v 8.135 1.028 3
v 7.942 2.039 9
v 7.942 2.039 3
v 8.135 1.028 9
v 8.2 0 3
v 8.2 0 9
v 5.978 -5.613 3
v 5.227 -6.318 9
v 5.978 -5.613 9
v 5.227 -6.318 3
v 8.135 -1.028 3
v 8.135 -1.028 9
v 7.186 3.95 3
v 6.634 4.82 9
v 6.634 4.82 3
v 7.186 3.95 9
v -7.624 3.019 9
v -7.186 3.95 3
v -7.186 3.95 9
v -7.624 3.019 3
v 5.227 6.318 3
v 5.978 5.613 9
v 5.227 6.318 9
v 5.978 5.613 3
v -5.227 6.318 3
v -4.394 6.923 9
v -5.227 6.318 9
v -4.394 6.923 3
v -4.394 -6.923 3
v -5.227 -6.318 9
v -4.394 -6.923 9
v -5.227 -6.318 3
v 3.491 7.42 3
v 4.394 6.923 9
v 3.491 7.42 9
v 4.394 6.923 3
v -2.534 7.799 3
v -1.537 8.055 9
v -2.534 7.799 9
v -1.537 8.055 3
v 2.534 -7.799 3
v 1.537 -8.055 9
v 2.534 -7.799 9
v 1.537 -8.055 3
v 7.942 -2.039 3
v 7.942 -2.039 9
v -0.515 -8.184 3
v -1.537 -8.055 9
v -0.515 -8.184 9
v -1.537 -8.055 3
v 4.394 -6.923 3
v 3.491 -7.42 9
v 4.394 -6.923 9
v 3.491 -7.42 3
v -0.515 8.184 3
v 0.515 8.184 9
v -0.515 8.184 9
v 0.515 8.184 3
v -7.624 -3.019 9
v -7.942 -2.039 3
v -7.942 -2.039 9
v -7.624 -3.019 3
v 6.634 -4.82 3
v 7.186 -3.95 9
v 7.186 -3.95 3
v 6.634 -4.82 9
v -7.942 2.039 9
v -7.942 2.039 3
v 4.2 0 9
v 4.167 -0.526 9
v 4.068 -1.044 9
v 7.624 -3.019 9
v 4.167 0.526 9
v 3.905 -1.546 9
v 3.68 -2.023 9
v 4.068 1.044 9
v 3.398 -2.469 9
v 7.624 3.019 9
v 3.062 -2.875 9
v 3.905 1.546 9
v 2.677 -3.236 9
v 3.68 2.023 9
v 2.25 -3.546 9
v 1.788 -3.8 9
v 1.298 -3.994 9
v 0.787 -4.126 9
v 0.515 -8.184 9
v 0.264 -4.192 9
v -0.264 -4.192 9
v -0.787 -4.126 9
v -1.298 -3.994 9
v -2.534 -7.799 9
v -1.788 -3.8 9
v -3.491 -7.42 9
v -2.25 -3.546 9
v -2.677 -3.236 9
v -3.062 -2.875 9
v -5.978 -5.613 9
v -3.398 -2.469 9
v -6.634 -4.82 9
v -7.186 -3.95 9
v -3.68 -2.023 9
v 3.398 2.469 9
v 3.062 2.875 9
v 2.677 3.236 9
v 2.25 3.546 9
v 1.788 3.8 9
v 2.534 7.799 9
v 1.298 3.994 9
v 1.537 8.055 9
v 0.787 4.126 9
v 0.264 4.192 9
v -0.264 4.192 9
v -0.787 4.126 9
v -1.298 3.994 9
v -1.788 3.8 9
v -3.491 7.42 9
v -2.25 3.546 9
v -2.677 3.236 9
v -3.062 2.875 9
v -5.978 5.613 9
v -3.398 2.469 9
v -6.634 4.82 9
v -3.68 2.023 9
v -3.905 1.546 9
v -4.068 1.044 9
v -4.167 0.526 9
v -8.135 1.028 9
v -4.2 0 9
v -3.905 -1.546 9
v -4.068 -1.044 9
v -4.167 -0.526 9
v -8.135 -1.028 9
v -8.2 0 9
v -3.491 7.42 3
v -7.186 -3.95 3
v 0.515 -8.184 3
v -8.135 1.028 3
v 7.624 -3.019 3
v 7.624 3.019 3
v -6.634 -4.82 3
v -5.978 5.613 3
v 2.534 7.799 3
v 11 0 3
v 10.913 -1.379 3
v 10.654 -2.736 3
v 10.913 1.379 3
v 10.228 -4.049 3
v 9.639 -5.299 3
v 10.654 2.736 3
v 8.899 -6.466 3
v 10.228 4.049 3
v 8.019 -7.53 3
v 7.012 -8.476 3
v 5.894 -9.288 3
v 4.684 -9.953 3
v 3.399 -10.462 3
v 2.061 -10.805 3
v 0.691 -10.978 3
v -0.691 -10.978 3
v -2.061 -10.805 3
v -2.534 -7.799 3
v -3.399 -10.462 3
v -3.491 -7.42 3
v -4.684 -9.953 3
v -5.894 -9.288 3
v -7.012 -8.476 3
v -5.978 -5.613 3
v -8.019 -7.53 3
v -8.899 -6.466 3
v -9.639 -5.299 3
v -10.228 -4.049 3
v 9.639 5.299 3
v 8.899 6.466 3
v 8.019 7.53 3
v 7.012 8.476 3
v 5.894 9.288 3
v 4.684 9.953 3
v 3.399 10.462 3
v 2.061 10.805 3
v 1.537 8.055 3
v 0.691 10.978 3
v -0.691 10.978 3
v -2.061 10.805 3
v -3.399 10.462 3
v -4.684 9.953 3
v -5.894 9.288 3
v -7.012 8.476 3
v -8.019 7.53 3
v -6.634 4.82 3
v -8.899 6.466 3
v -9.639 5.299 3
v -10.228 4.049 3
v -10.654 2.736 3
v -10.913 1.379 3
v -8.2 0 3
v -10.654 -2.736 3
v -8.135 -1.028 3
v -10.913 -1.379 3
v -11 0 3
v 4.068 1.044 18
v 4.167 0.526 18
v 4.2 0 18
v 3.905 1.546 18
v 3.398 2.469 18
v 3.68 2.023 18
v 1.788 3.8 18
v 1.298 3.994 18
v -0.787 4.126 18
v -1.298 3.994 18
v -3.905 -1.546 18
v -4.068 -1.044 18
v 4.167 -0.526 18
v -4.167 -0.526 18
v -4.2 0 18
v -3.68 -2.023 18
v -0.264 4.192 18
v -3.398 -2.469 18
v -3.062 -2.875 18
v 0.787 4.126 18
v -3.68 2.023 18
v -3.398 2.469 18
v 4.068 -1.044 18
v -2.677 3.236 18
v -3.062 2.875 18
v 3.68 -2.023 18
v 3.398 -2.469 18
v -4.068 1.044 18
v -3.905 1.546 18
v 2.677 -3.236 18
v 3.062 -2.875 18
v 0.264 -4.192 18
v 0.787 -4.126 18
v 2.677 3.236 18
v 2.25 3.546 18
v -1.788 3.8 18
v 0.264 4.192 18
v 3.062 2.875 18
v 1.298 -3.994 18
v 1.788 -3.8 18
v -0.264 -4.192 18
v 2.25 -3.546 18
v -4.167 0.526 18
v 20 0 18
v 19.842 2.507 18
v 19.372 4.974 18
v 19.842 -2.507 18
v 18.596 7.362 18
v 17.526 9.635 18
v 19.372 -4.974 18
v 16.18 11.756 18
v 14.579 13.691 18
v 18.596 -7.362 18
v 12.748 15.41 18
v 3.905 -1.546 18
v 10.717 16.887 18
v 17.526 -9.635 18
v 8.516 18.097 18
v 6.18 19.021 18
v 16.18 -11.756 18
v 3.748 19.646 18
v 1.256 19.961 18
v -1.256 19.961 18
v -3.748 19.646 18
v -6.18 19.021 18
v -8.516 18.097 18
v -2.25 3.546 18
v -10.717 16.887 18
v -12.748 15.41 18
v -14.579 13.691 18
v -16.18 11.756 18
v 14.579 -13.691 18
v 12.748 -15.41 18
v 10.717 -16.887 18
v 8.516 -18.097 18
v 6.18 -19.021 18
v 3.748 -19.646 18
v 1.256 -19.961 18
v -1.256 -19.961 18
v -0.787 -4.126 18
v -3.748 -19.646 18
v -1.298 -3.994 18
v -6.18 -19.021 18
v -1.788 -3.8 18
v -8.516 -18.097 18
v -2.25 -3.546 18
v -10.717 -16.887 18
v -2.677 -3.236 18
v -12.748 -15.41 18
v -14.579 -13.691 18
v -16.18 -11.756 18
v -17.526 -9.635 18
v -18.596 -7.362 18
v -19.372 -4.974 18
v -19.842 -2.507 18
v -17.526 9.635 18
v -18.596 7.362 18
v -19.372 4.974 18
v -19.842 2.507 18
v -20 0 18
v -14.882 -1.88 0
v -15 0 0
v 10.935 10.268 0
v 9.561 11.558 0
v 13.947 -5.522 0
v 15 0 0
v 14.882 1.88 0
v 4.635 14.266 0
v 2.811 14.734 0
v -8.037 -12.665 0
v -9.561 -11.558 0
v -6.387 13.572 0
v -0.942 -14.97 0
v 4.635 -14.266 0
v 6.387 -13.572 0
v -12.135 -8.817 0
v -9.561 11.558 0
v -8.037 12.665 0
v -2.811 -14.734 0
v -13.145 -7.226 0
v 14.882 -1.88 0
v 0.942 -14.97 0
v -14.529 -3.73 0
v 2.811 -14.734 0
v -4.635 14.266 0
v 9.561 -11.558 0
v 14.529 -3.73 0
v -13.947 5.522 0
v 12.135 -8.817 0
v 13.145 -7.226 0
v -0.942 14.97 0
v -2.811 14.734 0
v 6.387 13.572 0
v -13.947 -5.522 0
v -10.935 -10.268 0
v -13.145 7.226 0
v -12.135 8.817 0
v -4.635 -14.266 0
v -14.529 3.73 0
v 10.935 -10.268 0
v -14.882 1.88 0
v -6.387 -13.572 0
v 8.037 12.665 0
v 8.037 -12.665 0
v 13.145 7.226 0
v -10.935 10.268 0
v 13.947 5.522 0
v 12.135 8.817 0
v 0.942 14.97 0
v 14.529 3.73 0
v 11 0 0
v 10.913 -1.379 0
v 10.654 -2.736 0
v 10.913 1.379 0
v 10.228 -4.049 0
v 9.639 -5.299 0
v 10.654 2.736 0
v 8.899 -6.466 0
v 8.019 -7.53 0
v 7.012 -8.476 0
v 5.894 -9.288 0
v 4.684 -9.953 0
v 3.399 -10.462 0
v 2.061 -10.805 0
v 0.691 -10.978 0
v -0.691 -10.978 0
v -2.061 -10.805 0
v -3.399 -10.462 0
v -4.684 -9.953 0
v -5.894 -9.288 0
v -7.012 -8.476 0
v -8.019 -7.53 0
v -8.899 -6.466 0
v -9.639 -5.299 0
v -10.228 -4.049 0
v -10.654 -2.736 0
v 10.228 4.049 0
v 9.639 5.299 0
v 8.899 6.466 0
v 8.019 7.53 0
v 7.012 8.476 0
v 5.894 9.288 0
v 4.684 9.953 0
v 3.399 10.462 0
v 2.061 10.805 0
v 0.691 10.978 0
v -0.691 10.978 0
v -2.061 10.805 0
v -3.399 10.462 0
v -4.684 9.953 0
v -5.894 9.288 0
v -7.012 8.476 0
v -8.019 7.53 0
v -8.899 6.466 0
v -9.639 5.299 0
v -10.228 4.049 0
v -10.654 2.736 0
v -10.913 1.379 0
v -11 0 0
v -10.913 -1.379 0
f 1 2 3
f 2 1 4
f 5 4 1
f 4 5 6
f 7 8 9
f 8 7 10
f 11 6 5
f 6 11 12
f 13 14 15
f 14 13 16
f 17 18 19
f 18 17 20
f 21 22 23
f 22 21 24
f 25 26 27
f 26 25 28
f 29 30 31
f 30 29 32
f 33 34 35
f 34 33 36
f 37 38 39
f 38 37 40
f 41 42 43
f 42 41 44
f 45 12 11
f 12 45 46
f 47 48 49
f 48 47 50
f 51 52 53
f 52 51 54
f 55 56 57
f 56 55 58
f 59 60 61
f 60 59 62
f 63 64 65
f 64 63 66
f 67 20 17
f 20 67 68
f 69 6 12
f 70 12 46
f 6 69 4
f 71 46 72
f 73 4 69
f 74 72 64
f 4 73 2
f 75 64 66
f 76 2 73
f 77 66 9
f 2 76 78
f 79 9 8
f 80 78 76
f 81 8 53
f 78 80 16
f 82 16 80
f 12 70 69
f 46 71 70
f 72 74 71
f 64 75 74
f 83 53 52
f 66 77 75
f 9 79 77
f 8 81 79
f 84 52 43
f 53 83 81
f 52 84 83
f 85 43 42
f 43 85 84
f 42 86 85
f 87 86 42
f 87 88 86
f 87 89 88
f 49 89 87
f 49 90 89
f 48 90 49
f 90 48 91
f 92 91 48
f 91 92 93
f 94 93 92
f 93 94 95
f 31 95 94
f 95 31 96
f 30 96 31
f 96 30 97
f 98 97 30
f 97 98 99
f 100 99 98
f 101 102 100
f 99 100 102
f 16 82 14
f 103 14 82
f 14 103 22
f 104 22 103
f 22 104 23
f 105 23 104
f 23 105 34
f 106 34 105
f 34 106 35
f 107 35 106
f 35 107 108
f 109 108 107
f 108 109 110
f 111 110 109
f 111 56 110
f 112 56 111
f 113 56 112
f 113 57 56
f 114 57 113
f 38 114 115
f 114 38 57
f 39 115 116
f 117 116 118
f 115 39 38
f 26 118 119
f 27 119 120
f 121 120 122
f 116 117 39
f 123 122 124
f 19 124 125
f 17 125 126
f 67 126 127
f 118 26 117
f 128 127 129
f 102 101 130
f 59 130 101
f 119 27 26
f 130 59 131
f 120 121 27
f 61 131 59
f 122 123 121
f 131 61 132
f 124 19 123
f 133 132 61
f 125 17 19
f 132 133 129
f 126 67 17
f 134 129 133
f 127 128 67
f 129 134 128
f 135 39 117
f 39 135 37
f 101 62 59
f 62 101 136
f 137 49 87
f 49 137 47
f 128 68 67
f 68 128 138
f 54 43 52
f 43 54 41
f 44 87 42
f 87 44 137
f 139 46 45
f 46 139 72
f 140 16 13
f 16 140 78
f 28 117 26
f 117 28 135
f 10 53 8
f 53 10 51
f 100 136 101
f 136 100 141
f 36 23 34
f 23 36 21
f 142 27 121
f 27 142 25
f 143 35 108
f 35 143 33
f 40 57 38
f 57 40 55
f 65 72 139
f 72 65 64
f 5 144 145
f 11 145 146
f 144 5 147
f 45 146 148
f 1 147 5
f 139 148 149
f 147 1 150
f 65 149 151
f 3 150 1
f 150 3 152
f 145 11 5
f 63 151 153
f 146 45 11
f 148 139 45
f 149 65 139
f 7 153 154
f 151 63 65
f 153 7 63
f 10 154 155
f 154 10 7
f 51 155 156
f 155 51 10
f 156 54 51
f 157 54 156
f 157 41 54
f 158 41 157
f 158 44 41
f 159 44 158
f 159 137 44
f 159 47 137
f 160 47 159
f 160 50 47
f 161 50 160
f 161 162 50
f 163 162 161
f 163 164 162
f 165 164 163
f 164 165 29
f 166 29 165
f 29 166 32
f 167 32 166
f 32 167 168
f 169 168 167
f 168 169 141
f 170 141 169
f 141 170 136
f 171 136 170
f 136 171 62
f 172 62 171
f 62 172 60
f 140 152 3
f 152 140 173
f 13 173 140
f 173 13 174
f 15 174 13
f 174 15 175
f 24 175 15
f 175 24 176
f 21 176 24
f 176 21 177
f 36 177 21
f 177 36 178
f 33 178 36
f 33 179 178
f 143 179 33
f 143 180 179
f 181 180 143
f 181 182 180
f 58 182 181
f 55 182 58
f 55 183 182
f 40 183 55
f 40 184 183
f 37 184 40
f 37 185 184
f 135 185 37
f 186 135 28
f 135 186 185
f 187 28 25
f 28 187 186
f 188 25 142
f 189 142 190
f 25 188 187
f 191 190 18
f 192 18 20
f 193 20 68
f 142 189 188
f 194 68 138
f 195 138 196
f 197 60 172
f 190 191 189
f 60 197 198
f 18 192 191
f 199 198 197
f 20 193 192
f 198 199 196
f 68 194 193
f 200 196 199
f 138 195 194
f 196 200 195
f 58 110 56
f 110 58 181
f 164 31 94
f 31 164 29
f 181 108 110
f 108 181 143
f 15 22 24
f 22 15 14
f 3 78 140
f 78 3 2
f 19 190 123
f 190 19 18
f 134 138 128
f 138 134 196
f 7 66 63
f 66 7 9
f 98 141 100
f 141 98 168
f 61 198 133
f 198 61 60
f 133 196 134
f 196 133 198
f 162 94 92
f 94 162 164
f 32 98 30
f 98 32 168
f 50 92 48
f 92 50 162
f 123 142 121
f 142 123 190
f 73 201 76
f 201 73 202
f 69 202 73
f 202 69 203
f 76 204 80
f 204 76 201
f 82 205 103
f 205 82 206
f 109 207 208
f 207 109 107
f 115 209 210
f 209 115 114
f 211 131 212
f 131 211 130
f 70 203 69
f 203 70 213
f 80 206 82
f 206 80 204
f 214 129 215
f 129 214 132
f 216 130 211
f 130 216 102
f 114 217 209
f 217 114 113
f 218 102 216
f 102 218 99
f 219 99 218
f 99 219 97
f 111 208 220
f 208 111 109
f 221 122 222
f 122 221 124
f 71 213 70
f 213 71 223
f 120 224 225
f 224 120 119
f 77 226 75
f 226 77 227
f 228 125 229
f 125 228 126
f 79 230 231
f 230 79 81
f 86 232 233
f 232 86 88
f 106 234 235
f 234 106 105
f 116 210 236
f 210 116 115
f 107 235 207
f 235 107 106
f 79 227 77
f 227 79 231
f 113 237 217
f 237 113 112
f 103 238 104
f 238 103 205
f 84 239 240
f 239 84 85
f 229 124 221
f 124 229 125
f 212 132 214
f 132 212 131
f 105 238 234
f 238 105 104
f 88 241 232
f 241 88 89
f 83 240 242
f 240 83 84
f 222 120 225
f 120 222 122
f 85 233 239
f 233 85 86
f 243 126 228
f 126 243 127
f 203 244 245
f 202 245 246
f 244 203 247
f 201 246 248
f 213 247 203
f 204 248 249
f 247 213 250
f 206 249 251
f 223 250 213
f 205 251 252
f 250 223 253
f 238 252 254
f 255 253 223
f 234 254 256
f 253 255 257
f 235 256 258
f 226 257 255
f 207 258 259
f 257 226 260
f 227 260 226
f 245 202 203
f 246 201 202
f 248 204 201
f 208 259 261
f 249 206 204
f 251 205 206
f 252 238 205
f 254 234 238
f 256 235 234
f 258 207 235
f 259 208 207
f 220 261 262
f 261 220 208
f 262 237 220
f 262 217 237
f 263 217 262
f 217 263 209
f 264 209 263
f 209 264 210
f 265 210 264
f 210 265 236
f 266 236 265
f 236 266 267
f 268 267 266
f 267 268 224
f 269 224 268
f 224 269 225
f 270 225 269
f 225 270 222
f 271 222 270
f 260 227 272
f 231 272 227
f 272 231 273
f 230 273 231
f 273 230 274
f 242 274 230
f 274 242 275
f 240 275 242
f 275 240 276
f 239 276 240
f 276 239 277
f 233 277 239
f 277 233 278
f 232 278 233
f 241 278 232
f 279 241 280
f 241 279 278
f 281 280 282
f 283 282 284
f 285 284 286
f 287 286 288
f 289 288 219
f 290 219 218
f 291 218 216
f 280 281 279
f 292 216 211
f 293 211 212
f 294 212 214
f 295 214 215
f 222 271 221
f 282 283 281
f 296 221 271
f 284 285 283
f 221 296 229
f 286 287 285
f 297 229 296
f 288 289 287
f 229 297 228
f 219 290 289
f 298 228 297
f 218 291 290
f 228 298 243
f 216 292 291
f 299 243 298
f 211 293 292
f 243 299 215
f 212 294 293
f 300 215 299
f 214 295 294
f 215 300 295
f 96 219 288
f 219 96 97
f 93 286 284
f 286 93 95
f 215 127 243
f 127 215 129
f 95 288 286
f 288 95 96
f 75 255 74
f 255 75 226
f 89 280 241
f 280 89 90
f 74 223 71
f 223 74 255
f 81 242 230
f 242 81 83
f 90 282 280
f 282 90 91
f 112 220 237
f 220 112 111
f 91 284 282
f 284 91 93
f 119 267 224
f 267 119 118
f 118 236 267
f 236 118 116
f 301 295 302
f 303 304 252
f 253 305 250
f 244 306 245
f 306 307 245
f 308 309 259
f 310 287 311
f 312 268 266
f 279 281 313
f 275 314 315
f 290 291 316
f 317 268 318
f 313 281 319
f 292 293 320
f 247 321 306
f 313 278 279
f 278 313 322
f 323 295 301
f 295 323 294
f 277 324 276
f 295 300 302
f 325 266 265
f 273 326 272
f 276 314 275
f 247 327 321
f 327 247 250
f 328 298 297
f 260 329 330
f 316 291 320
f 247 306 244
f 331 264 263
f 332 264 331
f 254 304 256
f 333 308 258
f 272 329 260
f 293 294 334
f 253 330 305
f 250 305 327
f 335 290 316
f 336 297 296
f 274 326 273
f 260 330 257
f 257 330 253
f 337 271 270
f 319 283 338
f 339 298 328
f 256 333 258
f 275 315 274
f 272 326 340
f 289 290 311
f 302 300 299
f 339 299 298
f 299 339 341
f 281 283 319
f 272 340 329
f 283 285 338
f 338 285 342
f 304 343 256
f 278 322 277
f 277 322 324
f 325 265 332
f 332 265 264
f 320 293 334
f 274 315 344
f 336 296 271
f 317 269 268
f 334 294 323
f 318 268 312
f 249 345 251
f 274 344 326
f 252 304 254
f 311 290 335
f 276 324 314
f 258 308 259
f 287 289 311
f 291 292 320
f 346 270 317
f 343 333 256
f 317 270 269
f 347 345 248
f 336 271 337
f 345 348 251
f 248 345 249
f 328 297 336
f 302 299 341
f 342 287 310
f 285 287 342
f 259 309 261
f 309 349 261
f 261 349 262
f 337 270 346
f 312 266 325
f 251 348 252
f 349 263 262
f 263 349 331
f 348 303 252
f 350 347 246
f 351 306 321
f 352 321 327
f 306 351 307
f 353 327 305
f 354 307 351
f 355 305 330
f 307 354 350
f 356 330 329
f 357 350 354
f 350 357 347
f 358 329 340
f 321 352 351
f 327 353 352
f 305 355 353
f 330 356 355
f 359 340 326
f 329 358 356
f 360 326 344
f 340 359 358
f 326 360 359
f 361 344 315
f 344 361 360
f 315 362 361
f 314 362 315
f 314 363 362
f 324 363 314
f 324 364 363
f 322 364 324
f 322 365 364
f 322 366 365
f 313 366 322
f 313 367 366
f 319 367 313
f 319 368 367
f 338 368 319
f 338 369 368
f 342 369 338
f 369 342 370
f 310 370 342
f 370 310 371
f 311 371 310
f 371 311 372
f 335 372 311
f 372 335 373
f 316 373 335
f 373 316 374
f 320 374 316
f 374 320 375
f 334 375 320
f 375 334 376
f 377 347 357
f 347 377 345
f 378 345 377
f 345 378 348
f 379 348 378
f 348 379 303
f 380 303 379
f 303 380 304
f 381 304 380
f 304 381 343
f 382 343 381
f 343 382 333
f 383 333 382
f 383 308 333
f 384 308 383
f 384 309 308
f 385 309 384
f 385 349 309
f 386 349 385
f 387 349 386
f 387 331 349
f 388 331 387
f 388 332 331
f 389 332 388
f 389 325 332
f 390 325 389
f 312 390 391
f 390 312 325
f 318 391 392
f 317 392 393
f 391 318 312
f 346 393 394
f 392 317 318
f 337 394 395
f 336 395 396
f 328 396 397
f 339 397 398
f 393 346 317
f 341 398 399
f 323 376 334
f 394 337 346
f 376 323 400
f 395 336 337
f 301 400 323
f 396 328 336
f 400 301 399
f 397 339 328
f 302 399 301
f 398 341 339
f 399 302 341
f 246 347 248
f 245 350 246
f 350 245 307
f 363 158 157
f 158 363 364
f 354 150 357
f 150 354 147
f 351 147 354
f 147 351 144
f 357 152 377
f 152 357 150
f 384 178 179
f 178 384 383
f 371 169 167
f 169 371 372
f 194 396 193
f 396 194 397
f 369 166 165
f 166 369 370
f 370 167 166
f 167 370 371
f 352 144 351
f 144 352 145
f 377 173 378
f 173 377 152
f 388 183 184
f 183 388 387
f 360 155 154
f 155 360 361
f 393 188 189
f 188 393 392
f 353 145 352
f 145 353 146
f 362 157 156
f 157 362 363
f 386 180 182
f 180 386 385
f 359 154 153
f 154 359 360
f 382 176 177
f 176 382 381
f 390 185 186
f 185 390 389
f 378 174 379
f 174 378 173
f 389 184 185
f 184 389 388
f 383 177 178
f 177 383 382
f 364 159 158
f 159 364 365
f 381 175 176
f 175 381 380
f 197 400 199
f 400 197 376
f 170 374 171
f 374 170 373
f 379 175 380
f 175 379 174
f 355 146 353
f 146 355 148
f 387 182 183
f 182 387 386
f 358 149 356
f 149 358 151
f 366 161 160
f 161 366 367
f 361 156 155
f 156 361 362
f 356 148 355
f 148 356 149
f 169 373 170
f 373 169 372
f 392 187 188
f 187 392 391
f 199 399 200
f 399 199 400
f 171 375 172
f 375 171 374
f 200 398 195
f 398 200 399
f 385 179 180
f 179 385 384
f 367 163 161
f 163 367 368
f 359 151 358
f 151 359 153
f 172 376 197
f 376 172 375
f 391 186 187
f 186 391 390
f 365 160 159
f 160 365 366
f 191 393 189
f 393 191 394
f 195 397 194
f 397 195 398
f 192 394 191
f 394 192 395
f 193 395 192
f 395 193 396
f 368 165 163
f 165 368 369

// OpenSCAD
// file: ../lib/utils.scad
include <params.scad>;

function tol(val) = val - tolerance;

module cone(r, angle, invert=false) {
    h = tan((180 - angle) / 2) * r;
    translate([0, 0, -h]) {
        if (invert) {
                cylinder(r1=r,r2=0,h=h, $fn=20); 
        } else {
            cylinder(r1=0,r2=r,h=h, $fn=20); 
        }
    }
}

module roundrect(vect, r, $fn=20) {
    sq = len(vect) > 1
        ? [for (i = [0:1:len(vect)-1]) vect[i] - r * 2]
        : vect - r * 2;
    minkowski() {
        square(sq);
        translate([r, r])
            circle(r=r);
    }
}

module profile($fn=20) {
    minkowski() {
        translate([fan_case_radius, fan_case_radius, 0])
            square(fan_case - fan_case_radius * 2);
        circle(fan_case_radius, $fn);
    }
}

module fan_mount_points(radius, $fn=20) {
    offset = (fan_case - fan_screw_distance) / 2;
    translate([offset, offset, 0]) {
        circle(radius, $fn);
        translate([fan_screw_distance, 0, 0])
            circle(radius, $fn);
        translate([fan_screw_distance, fan_screw_distance, 0])
            circle(radius, $fn);
        translate([0, fan_screw_distance, 0])
            circle(radius, $fn);
    }
}

module square_grill(width, height, fin_width, fin_count) {
    fin_spacing = width / fin_count;
    difference() {
        square(width);
        union() {
            for (i = [0:1:fin_count]) {
                translate([(i + 1) * fin_spacing - (fin_spacing / 2) - (fin_width / 2), 0, 0])
                    square([fin_width, height]);
            }
        }
    }
}

module bushing(outer_r, inner_r, h) {
    linear_extrude(h)
        difference() {
            circle(r=outer_r);
            circle(r=inner_r);
        }
}

module screw_at_origin(r, d, l, head, head_d, cap, angle) {
    translate([0, 0, -l])
        screw(r, d, l, head, head_d, cap, angle);
}

module screw(r, d, l, head, head_d, cap, angle, fn=20, head_fn) {
    radius = r > 0 ? r : d / 2;
    head_r = head > 0 ? head : head_d / 2;
    hfn = head_fn ? head_fn : fn;

    union() {
        if (angle) {
            translate([0, 0, l])
                cone(head_r, angle, false);
        }
        linear_extrude(l)
            circle(r=radius, $fn=fn);
        if (cap > 0) {
            translate([0, 0, l - cap])
                linear_extrude(cap)
                    circle(r=head_r, $fn=hfn);
        }
    }
}

module inset_screw(r, d, l, head, head_d, cap, angle, inset, fn=20, head_fn) {
    screw_height = l - inset;
    head_r = head > 0 ? head : head_d / 2;

    union() {
        screw(
            r=r,
            d=d,
            l=screw_height,
            head=head_r,
            cap=cap,
            angle=angle,
            fn=fn,
            head_fn=head_fn
        );
        translate([0, 0, screw_height])
            linear_extrude(inset)
                circle(r=head_r, $fn=fn);
    }
}

function inch_to_mm(inches) = inches * 25.4;
// file: ../lib/params.scad
fan_case = 120;
fan_screw_distance = 105;
fan_case_depth = 25;
fan_case_radius = 5;
fan_case_screw_radius = 2.5;
fan_case_socket_cap_radius = 5.6 / 2;
fan_case_screw_head_radius = 3;
fan_case_screw_head_angle = 90;

grill_screw_size = 3;
grill_screw_radius = grill_screw_size / 2;
grill_screw_inset = 2;
grill_radius = 114 / 2;
grill_fin_offset = 10;
grill_fin_thickness = 2;
grill_fin_degrees = 30;

rear_grill_thickness = 2;

front_grill_thickness = 2;
front_grill_fin_count = 6;
front_grill_fin_thickness = 2;

filter_thickness = 5;
filter_width = fan_screw_distance - fan_case_screw_radius * 3;
filter_offset = (fan_case - filter_width) / 2;

base_retainer_thickness = 2;
base_height = 30;
base_cut_offset = 10;
base_retainer_inset = 4;

adapter_thickness = 2;
adapter_duct_in = 4;
adapter_height = 14;
adapter_duct_height = 50;
flat_adapter_duct_height = 50;
flat_adapter_screw_radius = 2;
flat_adapter_screw_head_radius = 4;

caddy_thickness = 2;
caddy_handle_width = 20;
caddy_handle_depth = 10;
caddy_handle_grip_count = 5;
caddy_handle_grip_depth = 1;
caddy_handle_grip_width = 1;
caddy_clip_height = 2;
caddy_clip_depth = 6;
caddy_clip_offset = 1;

foot_lower_radius = 15;
foot_upper_radius = 20;
foot_height = 18;
foot_inset_radius = 4;
foot_inset_depth = 3;
foot_screw_radius = 4;
foot_screw_inset = 6;
foot_screw_head_radius = 8;

power_supply_case_thickness = 3.0;
power_supply_screw_radius = 1.5;
power_supply_bushing_radius = 7.5;

power_supply_cable_pass_width = 18;
power_supply_cable_pass_height = 5;
power_supply_cable_pass_overhang = 5;
power_supply_cable_pass_overhang_depth = power_supply_case_thickness;
power_supply_cable_pass_depth = 3;
power_supply_cable_pass_thickness = 3;

tolerance = 0.2;
// main file
include <../lib/params.scad>;
use <../lib/utils.scad>;

$fn=50;

difference() {
    cylinder(r1=foot_lower_radius, r2=foot_upper_radius, h=foot_height);
    cylinder(r=foot_lower_radius-foot_inset_radius, h=foot_inset_depth);
    union() {
        translate([0, 0, foot_inset_depth])
            cylinder(r=foot_screw_head_radius+tolerance, h=foot_screw_inset);
        cylinder(r=foot_screw_radius+tolerance, h=foot_height);
    }
}
